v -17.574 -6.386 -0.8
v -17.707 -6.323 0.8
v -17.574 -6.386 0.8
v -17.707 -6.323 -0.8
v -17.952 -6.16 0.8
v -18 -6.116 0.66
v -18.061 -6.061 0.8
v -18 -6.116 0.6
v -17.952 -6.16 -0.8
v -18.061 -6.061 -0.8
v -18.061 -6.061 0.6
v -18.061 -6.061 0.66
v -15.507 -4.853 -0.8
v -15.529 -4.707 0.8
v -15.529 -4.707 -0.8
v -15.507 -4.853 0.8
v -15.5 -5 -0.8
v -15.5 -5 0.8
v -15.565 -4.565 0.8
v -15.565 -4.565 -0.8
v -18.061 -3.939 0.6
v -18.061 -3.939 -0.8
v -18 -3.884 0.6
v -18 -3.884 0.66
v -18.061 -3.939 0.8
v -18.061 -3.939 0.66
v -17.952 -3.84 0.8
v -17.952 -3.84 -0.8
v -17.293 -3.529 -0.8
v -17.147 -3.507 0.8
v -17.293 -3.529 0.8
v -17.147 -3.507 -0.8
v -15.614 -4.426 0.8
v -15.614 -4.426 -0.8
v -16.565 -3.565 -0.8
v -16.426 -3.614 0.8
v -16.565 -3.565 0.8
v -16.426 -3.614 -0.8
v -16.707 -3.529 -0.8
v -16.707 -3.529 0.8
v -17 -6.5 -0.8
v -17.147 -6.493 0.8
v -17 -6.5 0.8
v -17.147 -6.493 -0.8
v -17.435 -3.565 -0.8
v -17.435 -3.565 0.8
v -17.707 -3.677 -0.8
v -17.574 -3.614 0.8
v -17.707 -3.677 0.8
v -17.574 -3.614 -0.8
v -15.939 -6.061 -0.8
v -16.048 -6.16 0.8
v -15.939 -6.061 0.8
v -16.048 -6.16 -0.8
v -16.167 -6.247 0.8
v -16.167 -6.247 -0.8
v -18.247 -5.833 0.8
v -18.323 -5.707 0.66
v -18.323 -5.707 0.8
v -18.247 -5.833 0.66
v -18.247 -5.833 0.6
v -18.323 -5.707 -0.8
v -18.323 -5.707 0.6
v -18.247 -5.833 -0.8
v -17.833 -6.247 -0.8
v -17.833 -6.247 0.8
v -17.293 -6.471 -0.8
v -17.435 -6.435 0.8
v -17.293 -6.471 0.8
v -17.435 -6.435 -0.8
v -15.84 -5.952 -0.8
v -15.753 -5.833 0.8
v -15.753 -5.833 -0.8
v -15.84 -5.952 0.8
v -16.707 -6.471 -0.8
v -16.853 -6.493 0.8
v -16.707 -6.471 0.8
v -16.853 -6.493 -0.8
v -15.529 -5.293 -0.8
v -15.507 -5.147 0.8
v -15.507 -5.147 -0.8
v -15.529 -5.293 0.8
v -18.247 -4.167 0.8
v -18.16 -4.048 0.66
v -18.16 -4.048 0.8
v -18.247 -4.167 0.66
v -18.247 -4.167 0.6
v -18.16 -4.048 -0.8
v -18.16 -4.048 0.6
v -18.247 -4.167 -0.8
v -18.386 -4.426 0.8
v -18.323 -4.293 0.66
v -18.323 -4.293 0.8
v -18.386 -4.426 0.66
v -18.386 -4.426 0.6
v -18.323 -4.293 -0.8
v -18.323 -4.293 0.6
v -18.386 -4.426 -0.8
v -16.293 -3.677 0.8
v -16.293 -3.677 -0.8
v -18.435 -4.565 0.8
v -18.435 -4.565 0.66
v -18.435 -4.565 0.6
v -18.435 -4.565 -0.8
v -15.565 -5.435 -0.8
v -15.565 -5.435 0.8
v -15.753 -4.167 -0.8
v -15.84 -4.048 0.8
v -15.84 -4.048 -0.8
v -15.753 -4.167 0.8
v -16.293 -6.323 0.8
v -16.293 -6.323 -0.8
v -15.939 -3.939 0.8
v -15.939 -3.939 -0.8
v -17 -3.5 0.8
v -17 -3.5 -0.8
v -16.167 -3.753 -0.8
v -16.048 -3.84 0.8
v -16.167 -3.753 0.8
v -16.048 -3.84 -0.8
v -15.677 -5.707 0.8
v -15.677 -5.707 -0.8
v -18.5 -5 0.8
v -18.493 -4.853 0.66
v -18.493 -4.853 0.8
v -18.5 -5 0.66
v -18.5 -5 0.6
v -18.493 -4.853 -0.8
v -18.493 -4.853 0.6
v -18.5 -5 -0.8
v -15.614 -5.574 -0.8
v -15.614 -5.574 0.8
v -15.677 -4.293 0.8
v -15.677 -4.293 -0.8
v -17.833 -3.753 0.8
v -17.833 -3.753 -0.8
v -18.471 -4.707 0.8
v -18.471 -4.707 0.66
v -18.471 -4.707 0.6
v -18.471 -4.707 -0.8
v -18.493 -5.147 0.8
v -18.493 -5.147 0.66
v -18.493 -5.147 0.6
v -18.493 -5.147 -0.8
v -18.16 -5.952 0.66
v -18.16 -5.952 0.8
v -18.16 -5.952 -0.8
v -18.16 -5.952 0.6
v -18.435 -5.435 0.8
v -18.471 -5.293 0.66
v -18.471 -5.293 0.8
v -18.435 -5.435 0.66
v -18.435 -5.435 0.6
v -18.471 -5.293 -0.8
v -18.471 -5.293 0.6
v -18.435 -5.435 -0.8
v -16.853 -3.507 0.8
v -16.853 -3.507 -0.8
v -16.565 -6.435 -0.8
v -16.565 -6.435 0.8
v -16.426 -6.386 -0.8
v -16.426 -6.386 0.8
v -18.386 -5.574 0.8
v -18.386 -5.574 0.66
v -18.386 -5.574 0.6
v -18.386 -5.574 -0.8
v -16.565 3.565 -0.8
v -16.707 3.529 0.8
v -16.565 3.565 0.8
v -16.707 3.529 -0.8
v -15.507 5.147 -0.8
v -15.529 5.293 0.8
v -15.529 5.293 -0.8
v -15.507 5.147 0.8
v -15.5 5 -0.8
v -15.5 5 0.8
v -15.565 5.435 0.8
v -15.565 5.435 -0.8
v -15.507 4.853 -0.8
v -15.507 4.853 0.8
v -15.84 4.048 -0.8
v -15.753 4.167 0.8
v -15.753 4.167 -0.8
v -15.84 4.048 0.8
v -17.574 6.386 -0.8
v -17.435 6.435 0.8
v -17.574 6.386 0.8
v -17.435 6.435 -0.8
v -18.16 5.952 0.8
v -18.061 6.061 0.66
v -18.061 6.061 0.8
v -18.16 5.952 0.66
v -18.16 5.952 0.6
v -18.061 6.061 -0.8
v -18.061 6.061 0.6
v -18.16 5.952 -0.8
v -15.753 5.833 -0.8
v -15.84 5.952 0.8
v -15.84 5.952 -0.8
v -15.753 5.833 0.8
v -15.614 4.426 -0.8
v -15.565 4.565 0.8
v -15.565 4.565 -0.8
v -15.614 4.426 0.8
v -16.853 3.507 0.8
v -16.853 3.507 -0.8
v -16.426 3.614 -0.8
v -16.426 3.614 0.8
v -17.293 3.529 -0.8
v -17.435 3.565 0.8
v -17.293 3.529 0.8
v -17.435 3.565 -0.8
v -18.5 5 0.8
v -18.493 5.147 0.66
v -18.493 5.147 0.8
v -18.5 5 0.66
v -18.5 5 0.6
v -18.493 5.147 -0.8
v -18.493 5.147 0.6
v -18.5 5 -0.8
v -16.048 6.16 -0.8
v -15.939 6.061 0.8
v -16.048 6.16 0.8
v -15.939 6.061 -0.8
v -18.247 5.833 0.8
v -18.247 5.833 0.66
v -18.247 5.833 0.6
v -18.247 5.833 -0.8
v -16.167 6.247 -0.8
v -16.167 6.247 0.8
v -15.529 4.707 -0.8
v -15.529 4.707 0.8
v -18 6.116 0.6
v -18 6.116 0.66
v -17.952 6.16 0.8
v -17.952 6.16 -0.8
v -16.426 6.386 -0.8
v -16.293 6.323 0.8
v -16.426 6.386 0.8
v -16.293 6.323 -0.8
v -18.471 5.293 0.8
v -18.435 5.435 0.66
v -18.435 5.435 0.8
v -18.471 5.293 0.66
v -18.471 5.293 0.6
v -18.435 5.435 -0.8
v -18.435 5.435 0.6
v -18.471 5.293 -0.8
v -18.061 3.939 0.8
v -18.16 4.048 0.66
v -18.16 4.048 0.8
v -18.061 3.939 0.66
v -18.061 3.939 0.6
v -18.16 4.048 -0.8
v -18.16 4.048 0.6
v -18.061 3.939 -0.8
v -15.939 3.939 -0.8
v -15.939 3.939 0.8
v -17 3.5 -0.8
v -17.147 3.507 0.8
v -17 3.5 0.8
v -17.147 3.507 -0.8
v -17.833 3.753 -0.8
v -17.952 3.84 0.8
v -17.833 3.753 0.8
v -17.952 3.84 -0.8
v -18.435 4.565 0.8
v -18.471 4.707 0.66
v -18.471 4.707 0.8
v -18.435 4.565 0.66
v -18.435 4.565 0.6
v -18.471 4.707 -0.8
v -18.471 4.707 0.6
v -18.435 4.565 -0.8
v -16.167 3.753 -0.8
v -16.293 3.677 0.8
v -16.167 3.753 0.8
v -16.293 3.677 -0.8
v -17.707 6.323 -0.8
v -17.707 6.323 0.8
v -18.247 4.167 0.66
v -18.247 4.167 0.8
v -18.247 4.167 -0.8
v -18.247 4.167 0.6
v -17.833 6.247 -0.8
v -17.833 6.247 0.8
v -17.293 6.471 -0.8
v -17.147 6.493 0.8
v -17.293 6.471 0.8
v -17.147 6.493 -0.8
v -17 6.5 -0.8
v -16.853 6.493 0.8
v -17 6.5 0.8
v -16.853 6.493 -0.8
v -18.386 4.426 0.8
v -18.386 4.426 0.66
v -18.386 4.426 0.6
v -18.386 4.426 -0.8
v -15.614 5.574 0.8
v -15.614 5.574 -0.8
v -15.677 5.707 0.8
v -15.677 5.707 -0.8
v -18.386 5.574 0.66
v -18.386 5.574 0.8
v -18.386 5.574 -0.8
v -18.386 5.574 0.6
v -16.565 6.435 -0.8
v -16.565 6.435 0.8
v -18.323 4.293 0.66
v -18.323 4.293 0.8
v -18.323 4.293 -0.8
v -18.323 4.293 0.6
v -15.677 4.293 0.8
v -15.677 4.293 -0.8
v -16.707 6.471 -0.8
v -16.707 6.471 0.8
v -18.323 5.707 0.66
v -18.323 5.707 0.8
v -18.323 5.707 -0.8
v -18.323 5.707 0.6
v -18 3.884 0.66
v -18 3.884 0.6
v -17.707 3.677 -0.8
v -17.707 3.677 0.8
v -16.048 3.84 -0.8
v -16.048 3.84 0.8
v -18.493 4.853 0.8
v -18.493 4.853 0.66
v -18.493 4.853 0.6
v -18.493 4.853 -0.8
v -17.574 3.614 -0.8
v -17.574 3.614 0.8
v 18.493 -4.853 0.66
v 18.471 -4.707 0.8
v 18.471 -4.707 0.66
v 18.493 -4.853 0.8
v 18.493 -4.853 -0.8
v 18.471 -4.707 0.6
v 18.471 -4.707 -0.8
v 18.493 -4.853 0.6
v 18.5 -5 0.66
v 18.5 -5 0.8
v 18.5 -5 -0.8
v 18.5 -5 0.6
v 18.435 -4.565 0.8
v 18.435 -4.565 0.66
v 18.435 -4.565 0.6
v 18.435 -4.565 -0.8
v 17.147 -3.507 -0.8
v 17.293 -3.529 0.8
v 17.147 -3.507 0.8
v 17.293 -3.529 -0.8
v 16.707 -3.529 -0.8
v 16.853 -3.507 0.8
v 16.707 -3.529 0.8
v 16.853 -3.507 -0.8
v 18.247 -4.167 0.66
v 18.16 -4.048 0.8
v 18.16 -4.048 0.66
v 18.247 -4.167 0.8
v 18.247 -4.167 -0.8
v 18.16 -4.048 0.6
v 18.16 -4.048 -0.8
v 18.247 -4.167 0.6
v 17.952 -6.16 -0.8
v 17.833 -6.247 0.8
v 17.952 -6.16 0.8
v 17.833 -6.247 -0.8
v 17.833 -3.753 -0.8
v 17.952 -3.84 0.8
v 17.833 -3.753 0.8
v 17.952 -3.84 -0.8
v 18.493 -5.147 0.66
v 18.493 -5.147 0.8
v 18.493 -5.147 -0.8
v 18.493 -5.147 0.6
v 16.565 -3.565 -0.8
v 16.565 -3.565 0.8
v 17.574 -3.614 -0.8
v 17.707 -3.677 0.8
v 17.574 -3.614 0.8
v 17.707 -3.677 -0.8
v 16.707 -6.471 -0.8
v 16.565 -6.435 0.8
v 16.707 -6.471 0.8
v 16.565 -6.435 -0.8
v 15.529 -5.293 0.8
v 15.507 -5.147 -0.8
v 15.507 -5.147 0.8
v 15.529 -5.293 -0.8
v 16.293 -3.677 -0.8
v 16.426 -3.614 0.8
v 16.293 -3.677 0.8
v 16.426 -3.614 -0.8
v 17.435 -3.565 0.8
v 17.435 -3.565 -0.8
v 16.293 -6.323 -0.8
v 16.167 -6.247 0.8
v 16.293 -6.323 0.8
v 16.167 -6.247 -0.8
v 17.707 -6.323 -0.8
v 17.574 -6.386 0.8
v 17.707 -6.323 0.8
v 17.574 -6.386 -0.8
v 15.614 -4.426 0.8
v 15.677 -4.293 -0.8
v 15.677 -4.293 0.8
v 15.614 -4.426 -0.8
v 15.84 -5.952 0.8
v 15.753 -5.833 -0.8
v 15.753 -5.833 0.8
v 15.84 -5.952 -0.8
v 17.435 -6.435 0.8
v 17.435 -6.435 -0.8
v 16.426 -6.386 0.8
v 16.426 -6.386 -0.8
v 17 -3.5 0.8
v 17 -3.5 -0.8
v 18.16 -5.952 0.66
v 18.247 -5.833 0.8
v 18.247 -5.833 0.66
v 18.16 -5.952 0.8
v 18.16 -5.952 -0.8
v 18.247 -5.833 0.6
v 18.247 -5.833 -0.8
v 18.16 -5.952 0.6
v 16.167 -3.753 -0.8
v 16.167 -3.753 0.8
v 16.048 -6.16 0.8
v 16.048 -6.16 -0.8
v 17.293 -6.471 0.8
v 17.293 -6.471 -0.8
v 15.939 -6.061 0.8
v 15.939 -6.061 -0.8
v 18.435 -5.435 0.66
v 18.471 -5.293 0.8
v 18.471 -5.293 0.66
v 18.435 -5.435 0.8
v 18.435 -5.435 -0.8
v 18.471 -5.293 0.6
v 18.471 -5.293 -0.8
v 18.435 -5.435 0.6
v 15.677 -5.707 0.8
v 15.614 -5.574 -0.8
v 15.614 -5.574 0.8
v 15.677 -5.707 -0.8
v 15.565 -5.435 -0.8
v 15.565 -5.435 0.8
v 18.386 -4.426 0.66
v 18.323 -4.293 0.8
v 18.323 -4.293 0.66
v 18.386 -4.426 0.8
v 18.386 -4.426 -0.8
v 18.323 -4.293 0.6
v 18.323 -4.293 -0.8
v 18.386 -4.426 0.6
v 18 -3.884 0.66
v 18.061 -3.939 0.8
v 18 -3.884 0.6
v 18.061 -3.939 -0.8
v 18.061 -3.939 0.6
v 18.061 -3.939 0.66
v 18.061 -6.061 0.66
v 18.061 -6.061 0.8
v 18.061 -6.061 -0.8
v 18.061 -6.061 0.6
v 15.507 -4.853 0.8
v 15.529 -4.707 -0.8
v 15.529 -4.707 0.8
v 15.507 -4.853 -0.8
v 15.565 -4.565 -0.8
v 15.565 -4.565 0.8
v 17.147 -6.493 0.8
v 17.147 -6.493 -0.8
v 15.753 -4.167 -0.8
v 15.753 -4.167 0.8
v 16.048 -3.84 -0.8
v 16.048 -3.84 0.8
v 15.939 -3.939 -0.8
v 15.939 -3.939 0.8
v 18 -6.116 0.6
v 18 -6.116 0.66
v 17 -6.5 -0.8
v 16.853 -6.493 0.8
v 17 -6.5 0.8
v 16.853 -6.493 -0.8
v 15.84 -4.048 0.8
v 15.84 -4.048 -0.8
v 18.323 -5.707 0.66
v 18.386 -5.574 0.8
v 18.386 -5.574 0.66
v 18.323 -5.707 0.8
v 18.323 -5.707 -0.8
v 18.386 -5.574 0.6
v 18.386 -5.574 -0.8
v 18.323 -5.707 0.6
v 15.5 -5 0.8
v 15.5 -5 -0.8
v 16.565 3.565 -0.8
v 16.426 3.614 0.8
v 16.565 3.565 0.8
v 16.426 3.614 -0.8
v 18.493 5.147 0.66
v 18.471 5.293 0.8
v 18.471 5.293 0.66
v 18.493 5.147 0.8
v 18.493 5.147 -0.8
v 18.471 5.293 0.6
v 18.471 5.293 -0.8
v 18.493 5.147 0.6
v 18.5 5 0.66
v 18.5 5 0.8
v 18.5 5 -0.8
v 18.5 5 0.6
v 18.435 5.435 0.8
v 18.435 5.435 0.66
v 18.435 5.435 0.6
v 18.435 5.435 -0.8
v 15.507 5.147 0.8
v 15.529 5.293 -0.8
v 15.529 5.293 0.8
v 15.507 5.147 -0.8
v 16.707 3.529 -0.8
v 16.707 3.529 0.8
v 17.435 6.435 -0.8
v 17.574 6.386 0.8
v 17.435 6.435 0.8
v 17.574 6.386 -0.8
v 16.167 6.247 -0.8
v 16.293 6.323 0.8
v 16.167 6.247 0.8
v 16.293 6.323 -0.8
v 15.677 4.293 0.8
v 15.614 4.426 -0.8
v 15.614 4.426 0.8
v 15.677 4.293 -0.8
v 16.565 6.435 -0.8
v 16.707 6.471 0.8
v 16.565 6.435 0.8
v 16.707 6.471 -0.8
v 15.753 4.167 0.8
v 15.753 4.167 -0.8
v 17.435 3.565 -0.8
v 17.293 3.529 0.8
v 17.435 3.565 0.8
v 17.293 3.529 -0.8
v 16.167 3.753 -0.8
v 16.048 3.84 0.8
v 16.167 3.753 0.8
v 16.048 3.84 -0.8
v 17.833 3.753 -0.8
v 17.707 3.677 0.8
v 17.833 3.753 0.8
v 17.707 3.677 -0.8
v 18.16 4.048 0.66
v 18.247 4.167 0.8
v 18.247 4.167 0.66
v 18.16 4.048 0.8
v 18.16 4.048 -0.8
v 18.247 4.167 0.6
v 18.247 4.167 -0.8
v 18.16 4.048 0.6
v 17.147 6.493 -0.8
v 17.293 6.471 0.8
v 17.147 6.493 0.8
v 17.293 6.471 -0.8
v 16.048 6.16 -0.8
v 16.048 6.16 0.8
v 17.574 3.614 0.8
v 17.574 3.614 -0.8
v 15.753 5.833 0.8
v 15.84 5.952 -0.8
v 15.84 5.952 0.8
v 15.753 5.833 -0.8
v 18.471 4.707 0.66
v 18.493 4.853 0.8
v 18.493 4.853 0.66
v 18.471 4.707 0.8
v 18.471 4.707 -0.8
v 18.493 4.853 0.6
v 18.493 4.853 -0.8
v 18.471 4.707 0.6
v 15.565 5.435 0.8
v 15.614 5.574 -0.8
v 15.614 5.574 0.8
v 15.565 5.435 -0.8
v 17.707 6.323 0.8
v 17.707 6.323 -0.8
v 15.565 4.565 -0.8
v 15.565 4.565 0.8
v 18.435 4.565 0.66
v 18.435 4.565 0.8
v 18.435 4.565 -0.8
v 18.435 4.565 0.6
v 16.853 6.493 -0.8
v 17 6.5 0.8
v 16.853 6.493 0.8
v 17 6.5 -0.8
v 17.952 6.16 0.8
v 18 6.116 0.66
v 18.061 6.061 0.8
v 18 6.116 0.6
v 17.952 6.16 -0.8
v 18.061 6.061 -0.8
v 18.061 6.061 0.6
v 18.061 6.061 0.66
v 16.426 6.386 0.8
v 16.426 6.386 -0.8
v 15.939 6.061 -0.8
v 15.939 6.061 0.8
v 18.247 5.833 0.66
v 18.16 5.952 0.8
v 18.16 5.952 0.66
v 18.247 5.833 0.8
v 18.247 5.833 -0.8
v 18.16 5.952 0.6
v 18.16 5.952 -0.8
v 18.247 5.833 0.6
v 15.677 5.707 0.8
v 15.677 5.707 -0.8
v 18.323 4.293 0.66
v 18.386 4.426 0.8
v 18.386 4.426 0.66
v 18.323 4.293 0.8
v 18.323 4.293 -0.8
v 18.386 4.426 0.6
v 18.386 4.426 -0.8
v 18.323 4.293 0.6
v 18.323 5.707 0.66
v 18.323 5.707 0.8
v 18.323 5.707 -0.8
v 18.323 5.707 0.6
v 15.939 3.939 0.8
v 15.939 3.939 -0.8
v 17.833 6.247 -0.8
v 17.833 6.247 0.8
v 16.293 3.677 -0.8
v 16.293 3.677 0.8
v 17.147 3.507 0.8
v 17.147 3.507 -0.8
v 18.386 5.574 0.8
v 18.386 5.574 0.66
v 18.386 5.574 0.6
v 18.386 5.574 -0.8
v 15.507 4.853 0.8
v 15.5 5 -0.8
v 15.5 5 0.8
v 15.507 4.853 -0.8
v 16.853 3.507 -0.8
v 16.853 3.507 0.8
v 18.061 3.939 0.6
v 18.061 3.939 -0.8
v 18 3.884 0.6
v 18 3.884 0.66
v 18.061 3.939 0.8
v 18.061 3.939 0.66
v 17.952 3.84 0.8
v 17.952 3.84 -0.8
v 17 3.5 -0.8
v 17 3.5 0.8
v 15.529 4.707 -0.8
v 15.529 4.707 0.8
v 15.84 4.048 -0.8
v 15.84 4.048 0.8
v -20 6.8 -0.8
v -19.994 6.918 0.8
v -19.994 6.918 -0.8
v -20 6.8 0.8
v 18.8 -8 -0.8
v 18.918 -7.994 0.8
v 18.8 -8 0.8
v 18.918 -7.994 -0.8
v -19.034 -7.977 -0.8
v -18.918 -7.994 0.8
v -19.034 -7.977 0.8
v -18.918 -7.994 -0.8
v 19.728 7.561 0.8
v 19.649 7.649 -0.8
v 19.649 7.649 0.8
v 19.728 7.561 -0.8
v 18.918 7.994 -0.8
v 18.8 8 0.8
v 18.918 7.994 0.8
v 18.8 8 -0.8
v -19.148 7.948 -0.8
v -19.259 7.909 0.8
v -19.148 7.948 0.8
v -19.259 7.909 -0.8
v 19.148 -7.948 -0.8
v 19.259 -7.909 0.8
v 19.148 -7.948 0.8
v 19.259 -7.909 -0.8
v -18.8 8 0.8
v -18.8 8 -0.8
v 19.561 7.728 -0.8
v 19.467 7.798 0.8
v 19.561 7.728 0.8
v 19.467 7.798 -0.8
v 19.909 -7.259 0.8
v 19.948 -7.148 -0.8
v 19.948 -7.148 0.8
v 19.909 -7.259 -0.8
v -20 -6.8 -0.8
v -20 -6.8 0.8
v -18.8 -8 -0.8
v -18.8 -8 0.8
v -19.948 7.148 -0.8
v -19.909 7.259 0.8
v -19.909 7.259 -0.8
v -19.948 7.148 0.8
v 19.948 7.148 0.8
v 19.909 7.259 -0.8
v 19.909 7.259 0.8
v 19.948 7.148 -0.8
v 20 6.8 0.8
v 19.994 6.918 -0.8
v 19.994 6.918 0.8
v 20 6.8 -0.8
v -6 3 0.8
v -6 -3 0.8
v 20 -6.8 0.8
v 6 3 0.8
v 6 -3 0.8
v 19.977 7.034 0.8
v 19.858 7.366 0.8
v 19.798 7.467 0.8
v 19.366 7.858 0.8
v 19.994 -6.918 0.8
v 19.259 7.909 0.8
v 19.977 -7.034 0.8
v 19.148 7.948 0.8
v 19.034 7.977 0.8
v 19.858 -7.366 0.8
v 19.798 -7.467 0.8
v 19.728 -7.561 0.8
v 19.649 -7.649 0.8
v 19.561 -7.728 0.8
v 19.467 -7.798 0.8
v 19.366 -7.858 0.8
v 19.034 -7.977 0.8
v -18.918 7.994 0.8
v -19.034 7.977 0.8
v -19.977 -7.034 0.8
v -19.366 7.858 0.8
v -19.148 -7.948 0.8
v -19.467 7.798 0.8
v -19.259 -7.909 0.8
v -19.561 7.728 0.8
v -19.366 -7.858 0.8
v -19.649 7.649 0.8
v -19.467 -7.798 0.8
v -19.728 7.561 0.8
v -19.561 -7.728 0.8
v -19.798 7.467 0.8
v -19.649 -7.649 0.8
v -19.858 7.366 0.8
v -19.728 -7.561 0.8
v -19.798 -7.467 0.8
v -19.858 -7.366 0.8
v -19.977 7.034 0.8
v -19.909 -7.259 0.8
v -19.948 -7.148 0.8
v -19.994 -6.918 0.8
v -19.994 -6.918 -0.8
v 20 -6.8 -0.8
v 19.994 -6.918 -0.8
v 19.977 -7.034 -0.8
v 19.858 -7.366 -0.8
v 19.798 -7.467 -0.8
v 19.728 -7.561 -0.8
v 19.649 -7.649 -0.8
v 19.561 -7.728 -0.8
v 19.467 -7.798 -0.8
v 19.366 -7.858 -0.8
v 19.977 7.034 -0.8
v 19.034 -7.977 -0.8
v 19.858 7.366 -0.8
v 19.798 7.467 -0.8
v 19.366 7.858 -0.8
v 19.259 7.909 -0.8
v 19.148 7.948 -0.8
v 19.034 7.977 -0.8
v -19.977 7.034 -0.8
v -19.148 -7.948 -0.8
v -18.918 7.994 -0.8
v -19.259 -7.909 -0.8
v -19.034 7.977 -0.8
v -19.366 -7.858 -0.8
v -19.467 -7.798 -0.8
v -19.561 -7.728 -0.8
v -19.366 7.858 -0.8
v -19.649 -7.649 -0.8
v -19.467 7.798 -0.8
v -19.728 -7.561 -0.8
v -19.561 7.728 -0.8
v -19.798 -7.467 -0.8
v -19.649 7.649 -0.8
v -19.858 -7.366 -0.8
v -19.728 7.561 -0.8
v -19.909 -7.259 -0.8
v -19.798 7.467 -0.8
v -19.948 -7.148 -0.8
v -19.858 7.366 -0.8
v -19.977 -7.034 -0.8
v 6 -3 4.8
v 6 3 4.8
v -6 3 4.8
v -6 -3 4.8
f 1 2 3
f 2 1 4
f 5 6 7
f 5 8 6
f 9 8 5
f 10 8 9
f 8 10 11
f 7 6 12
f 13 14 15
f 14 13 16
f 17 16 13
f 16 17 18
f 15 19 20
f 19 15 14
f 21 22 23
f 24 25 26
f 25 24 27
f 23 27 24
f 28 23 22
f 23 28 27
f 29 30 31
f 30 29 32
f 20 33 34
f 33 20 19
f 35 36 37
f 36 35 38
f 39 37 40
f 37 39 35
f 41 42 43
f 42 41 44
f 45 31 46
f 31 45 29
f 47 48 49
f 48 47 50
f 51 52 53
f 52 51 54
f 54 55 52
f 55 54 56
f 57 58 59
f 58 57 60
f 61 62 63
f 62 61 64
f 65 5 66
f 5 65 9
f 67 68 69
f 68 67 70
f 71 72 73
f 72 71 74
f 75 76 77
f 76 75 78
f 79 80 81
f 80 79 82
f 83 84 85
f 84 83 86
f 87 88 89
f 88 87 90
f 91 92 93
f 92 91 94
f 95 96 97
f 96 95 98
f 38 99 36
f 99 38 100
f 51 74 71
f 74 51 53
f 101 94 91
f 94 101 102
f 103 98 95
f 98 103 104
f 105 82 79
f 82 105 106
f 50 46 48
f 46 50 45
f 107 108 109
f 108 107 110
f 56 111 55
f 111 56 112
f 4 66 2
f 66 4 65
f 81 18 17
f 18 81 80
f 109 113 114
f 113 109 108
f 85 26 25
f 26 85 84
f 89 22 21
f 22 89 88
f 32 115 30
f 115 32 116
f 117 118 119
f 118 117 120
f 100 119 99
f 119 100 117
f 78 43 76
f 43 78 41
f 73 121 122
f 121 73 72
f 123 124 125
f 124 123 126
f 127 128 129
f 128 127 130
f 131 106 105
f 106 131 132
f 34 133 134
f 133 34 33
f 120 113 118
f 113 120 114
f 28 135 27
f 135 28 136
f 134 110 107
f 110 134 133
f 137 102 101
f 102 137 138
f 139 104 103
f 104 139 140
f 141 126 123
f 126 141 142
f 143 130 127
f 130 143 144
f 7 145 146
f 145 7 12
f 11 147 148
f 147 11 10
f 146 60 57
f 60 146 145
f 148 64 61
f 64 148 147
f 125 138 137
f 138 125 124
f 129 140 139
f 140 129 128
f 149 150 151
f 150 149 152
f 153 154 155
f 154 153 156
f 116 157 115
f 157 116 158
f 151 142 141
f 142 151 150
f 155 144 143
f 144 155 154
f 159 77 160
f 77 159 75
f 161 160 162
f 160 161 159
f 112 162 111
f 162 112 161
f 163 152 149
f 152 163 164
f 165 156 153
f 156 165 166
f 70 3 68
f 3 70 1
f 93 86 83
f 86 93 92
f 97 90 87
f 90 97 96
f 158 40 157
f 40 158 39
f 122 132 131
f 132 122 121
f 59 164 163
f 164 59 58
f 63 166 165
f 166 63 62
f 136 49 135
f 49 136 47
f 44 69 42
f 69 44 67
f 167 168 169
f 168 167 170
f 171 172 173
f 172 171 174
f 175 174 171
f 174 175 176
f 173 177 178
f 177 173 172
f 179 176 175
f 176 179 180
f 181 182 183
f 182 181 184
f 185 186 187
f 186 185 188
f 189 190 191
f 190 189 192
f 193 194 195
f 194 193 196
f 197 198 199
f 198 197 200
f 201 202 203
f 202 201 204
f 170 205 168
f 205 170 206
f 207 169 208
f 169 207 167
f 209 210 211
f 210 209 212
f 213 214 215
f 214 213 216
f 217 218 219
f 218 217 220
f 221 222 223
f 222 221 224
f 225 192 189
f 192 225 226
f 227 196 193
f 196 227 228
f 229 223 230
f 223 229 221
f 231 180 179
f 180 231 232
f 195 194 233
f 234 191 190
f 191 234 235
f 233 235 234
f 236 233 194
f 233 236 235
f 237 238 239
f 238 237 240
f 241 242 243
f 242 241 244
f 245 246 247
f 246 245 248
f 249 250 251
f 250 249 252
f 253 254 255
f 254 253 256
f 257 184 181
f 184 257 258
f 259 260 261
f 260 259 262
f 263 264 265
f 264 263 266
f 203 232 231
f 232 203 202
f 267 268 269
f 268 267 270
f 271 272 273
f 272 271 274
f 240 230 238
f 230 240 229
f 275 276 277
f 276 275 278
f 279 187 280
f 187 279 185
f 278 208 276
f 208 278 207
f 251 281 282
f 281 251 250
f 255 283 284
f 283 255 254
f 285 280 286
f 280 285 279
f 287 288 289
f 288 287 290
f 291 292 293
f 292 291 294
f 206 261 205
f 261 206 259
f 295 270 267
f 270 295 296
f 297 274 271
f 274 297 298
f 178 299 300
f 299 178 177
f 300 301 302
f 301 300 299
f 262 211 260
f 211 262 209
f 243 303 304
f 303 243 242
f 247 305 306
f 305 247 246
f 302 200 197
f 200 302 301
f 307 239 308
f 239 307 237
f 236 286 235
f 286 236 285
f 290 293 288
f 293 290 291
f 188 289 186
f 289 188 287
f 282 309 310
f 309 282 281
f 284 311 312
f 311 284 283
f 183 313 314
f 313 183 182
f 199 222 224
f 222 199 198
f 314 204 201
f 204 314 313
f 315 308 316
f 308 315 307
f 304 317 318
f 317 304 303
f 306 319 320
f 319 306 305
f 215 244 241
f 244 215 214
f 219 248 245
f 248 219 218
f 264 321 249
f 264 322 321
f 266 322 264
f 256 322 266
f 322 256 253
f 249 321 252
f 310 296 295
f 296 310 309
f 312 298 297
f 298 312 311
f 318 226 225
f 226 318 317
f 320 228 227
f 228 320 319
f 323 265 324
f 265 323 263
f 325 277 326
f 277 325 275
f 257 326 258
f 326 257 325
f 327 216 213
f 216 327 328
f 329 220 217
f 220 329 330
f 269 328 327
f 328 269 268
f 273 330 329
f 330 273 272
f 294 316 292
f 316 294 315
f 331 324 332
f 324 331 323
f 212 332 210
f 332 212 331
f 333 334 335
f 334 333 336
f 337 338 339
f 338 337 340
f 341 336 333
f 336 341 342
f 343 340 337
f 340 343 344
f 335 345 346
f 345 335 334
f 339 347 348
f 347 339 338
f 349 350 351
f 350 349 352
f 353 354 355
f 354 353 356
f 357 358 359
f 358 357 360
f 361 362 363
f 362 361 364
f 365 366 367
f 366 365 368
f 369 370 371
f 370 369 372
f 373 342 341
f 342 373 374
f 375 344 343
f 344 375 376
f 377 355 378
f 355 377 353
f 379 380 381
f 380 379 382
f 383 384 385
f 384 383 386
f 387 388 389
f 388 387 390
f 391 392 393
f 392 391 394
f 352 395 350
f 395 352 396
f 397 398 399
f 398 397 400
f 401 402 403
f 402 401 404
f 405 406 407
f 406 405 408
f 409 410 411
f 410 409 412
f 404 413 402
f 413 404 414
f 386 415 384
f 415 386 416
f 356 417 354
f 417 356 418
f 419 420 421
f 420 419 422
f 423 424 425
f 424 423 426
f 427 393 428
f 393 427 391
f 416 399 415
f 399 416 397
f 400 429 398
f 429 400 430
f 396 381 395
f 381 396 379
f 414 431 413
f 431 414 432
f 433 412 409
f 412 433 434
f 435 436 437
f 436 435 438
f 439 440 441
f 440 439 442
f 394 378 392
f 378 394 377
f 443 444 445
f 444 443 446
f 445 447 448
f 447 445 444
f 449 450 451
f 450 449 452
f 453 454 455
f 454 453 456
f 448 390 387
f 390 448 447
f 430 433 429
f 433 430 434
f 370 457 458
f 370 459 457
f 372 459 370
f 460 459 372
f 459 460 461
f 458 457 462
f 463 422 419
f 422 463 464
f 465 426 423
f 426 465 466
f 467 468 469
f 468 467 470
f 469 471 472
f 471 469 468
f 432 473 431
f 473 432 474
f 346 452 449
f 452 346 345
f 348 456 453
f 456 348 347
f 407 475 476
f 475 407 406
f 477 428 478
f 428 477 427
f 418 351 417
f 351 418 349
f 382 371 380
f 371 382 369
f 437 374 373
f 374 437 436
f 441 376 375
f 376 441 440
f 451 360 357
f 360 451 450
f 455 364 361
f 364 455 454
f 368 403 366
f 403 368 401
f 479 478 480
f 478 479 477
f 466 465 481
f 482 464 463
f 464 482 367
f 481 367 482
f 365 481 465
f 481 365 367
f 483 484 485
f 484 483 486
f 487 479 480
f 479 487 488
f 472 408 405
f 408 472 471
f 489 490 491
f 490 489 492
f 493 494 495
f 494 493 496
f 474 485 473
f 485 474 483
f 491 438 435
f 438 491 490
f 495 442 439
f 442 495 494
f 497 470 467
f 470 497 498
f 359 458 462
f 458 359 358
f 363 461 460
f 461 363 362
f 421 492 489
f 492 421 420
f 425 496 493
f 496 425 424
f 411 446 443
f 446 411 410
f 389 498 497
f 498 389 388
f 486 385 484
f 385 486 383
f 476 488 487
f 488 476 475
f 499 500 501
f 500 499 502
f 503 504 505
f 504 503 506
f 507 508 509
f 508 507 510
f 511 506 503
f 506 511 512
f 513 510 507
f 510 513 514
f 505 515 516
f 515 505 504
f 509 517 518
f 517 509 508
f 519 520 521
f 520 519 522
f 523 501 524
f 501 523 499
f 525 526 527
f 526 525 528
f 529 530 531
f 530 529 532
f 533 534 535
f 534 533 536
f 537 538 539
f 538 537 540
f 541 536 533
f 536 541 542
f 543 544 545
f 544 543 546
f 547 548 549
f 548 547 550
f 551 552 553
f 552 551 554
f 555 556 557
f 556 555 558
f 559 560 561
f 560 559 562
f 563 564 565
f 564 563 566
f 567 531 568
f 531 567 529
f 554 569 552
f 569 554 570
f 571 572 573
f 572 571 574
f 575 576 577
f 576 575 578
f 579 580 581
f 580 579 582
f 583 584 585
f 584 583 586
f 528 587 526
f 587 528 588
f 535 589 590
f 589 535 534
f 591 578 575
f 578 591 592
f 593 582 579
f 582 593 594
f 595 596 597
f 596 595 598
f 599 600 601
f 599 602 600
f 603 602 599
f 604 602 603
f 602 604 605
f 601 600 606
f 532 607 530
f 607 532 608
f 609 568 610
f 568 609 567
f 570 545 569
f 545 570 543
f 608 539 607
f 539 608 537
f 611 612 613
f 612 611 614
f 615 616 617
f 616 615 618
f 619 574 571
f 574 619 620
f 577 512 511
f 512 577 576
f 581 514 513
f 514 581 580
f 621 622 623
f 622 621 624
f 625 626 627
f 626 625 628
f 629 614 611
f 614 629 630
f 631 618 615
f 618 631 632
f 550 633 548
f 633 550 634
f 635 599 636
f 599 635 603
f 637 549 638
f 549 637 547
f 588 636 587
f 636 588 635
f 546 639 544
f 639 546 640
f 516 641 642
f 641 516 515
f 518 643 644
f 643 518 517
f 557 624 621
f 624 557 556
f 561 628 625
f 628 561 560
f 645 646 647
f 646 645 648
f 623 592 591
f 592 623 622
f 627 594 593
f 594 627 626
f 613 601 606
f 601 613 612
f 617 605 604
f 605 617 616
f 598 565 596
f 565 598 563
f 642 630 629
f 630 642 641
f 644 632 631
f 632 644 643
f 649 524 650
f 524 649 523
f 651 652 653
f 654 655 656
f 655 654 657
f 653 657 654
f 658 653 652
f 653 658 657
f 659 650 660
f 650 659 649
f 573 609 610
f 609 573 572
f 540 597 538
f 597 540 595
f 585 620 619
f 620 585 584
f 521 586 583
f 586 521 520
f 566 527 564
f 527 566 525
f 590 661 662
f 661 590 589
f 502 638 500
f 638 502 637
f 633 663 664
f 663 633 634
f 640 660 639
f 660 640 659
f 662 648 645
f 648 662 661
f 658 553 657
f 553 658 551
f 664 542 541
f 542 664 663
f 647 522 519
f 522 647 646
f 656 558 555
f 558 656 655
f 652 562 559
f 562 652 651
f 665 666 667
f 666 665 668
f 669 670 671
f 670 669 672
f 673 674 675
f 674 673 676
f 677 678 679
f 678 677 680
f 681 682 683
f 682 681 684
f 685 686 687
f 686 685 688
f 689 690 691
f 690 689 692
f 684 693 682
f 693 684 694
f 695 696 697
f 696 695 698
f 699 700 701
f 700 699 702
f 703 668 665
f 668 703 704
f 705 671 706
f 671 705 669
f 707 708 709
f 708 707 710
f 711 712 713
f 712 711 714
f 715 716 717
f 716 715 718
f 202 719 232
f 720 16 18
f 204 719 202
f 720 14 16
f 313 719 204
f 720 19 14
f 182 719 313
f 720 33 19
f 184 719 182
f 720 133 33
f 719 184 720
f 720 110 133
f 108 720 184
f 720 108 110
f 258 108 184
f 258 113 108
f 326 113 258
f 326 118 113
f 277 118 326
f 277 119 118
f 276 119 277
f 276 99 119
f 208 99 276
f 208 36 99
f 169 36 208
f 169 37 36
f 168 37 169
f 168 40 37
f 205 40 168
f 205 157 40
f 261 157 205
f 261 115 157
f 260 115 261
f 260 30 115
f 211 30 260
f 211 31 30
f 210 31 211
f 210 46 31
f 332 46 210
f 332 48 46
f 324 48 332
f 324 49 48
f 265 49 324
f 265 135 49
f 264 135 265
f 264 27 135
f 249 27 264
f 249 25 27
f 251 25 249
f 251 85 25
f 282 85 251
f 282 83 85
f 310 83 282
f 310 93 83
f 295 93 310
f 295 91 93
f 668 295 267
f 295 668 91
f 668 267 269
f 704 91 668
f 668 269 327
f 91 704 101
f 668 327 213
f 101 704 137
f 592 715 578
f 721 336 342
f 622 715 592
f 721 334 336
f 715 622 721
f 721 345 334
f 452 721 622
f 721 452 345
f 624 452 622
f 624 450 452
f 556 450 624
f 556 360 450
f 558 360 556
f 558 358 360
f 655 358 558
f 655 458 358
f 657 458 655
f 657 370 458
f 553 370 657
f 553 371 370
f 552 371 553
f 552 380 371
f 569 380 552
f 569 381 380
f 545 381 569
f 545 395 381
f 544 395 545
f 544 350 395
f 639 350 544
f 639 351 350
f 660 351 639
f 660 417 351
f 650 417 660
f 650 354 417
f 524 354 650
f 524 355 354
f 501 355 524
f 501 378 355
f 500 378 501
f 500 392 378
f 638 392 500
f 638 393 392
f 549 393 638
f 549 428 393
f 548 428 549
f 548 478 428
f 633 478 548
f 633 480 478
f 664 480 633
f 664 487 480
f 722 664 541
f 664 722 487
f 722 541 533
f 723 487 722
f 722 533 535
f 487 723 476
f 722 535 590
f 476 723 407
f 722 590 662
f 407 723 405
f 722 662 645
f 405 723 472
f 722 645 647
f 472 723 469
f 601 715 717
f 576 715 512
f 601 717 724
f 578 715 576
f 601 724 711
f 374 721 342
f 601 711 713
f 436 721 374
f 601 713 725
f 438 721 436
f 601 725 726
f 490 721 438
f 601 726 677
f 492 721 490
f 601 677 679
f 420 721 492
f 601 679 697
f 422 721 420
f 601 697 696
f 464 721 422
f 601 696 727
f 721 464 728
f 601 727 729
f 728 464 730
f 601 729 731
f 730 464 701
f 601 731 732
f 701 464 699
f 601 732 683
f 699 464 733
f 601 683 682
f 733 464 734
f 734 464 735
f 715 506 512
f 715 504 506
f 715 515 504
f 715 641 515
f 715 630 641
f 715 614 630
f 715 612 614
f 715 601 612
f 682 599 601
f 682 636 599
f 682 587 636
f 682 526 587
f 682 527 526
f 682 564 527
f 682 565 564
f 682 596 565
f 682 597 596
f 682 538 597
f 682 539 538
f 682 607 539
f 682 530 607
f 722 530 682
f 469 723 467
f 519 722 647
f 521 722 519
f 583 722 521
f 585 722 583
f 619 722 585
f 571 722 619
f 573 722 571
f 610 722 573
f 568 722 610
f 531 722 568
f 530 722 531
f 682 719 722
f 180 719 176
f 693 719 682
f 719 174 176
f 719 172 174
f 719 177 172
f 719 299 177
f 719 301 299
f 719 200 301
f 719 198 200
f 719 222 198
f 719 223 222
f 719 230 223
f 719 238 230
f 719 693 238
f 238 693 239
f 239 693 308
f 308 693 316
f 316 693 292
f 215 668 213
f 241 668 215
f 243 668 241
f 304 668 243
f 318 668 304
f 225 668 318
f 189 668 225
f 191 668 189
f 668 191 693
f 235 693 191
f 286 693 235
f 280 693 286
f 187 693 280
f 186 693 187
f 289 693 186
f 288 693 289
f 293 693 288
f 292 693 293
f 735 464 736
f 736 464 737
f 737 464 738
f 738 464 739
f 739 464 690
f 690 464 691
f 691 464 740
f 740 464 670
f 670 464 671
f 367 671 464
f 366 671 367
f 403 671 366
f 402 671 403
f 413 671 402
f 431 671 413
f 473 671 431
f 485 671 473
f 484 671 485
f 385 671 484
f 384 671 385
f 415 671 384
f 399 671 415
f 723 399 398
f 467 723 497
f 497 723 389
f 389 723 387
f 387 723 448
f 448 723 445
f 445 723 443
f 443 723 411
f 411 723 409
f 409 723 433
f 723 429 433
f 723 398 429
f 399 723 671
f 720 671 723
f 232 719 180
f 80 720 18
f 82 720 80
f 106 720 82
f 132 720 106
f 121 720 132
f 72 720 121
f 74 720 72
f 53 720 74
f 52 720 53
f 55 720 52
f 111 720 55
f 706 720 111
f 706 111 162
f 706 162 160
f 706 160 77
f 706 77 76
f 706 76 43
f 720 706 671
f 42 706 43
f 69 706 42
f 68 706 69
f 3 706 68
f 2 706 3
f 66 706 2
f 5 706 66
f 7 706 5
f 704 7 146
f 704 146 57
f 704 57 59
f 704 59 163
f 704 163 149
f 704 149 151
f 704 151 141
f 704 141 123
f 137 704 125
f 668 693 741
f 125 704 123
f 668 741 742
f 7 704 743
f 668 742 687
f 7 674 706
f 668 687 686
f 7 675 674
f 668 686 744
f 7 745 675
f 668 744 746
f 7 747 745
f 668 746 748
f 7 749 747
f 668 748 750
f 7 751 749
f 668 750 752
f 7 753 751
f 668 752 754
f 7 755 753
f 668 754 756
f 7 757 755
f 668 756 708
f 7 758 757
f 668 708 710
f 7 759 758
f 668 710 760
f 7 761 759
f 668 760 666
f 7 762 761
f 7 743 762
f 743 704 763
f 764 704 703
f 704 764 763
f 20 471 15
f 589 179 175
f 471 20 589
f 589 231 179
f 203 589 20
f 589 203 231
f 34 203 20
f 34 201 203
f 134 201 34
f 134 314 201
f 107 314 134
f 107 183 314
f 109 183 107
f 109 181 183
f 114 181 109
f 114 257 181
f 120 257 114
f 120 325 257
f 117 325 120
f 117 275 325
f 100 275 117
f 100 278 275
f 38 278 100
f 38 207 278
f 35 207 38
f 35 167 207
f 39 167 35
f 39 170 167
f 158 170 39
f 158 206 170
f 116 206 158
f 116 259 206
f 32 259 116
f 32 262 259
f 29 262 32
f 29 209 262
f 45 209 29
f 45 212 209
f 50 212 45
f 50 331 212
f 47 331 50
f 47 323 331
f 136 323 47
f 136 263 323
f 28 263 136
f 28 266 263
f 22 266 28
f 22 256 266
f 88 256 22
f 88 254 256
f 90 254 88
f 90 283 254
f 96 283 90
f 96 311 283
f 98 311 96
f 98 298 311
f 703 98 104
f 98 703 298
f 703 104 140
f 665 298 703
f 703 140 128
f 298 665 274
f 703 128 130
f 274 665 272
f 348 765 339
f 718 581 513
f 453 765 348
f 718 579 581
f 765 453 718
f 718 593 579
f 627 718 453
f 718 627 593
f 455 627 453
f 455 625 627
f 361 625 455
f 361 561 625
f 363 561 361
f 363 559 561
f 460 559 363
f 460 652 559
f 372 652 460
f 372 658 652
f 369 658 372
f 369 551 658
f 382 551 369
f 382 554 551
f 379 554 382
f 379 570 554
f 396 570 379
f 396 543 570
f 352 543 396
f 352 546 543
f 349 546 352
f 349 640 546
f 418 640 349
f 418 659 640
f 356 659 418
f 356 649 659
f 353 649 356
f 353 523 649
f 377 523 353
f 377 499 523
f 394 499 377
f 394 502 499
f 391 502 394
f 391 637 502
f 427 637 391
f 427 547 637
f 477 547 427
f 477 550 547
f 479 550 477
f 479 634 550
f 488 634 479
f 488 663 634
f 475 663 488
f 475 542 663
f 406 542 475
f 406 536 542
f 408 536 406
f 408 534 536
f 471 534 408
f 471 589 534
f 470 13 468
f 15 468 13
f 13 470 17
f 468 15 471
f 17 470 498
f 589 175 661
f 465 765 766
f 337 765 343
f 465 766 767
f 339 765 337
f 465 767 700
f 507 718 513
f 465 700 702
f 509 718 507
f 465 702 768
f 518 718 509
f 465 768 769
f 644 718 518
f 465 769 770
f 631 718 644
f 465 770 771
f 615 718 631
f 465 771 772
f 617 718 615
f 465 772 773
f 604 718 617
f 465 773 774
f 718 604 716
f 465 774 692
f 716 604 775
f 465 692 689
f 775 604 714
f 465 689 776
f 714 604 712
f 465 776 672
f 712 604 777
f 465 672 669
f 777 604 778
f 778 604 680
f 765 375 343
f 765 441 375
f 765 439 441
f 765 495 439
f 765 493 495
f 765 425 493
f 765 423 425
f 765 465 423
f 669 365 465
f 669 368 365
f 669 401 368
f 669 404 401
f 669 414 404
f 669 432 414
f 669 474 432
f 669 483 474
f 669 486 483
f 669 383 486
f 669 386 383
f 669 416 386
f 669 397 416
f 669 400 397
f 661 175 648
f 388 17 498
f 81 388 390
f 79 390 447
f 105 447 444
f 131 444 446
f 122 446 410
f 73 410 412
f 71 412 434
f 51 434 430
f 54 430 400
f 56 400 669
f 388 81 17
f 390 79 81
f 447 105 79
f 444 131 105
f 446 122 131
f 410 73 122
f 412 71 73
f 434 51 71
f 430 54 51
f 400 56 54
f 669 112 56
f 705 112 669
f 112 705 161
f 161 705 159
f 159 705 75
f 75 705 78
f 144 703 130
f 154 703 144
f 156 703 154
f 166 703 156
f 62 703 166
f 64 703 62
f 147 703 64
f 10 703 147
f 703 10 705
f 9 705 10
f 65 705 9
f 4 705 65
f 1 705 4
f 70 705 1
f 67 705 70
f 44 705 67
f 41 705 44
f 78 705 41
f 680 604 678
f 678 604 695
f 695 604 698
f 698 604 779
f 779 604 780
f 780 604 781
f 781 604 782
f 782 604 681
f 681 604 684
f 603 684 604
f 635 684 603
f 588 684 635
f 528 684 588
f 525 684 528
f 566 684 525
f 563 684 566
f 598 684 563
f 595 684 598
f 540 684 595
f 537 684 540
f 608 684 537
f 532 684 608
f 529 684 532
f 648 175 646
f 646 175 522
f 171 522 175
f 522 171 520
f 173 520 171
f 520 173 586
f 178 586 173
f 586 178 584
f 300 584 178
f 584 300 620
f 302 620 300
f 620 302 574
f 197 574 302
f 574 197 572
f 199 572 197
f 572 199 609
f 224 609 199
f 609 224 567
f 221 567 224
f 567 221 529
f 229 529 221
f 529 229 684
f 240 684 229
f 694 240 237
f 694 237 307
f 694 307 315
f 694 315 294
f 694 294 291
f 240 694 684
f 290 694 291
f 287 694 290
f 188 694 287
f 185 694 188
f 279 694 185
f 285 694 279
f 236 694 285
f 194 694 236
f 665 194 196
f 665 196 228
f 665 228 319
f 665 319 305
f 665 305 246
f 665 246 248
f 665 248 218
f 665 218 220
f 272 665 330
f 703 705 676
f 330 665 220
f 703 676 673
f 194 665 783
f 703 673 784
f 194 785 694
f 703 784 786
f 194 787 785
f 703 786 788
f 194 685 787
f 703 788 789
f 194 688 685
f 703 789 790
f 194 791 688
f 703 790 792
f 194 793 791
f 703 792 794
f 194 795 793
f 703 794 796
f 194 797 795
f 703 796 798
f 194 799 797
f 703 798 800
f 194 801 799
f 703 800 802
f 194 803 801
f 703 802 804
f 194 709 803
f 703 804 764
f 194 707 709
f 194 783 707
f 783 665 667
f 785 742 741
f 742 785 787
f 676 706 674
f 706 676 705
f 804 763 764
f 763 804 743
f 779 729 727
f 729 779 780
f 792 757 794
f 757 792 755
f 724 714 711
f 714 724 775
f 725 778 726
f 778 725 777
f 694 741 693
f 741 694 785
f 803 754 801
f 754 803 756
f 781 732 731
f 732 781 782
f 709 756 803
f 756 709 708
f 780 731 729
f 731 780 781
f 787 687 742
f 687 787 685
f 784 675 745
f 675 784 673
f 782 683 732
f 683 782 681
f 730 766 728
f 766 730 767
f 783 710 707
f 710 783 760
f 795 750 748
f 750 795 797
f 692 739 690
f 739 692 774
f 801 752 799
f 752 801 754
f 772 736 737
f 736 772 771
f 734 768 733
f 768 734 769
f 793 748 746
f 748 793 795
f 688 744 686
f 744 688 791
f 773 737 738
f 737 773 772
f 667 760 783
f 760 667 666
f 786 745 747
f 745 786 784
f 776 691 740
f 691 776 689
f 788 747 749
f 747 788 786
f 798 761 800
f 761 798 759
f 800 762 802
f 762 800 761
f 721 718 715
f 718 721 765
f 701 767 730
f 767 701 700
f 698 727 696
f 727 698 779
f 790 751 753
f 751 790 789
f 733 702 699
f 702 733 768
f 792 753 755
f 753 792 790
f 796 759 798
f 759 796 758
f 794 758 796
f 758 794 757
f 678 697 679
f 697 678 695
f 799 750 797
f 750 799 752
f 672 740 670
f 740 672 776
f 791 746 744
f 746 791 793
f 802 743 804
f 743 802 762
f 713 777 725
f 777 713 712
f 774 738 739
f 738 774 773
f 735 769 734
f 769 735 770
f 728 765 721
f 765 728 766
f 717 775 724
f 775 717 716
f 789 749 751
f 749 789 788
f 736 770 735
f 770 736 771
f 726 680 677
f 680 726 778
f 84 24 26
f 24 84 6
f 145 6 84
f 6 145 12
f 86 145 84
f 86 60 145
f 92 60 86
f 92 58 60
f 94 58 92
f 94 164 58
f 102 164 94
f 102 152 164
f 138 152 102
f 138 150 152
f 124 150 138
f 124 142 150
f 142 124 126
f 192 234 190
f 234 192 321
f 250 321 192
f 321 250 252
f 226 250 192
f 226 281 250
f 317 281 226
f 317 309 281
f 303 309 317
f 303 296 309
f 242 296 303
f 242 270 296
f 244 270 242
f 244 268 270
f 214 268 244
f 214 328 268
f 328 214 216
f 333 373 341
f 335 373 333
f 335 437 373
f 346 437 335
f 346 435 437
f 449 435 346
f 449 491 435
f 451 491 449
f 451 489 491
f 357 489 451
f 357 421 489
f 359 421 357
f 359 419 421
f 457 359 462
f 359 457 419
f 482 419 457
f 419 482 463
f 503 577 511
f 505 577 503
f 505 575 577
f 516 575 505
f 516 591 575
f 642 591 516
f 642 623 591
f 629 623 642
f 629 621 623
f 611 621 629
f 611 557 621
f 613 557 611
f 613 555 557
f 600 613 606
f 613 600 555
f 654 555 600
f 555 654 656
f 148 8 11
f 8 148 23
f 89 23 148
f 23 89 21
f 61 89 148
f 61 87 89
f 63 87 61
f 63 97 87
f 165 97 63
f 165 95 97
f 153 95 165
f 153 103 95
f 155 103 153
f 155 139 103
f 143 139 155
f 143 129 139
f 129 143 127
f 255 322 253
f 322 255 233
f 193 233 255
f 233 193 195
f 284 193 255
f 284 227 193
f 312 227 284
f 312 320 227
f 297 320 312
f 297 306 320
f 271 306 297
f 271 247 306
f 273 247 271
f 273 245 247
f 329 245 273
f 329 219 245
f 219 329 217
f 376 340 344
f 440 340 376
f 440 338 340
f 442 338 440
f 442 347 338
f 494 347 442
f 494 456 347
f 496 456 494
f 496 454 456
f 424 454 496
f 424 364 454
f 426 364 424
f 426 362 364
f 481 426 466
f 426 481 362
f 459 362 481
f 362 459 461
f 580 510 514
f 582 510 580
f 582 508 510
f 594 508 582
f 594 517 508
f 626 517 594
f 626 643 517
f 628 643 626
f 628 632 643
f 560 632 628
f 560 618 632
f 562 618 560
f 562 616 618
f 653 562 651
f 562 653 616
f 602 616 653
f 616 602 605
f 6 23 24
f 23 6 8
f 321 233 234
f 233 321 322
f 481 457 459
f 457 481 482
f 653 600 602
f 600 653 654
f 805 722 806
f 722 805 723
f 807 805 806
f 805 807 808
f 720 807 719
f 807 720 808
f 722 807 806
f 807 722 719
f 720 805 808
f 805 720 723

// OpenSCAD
$fn = 64;

// Parameters
length_mm = 40; //[20:80:1]
width_mm  = 16; //[8:32:1]
thickness_mm = 1.6; //[0.8:3.2:0.1]

// Feature parameters
corner_r = 1.2;                 // rounded corner radius
hole_d = 3.0;                   // mounting hole diameter
hole_edge_x = 3.0;              // hole center offset from left/right edge
hole_edge_y = 3.0;              // hole center offset from bottom/top edge

copper_t = 0.08;                // copper thickness (visual)
silk_t   = 0.06;                // silkscreen thickness (visual)

// Structural overlap to guarantee attachment (1-2mm as required)
overlap_mm = 1.0;

// Simple connector block on top side
conn_w = 12.0;
conn_d = 6.0;
conn_h = 5.0;

// Helper: rounded rectangle prism (centered)
module rounded_plate(l, w, h, r) {
    linear_extrude(height=h, center=true)
        offset(r=r)
            square([l - 2*r, w - 2*r], center=true);
}

module RAMPSEndstop() {

    // Derived Z positions (centered model)
    pcb_top_z =  thickness_mm/2;

    // --- FIX: Ensure connector is physically attached (overlaps PCB in Z by overlap_mm)
    // Bottom of connector = pcb_top_z - overlap_mm
    // Center Z = bottom + conn_h/2
    conn_center_z = (pcb_top_z - overlap_mm) + conn_h/2;

    // --- FIX: Ensure connector is not offset away from PCB in Y.
    // Place it centered in Y so it visibly sits on the PCB in all views.
    conn_center_y = 0;

    // Pins: ensure they intersect the connector body (and optionally the PCB)
    pin_d = 1.0;
    pin_h = 3.0;
    pin_pitch = 2.54;

    // Put pins so their TOP penetrates into connector by overlap_mm
    // pin_top_z = conn_center_z + conn_h/2 - overlap_mm
    // => pin_center_z = pin_top_z - pin_h/2
    pin_center_z = (conn_center_z + conn_h/2 - overlap_mm) - pin_h/2;

    // Put pins under the connector in Y, slightly inside the connector depth
    pin_center_y = conn_center_y - conn_d/2 + pin_d/2 + overlap_mm;

    union() {

        // PCB body with mounting holes
        color([0.0, 0.4, 0.2])
        difference() {
            rounded_plate(length_mm, width_mm, thickness_mm, corner_r);

            // 4 corner mounting holes (through)
            for (sx = [-1, 1], sy = [-1, 1]) {
                translate([ sx*(length_mm/2 - hole_edge_x),
                            sy*(width_mm/2  - hole_edge_y),
                            0 ])
                    cylinder(d=hole_d, h=thickness_mm + 2, center=true);
            }
        }

        // Copper pads/traces (top) - thin raised features, overlapped into PCB
        color([0.75, 0.45, 0.1])
        translate([0, 0, pcb_top_z + copper_t/2 - 0.2])  // small embed for manifold
        union() {
            cube([length_mm*0.75, 1.2, copper_t], center=true);

            for (i = [-2:2]) {
                translate([i*(length_mm*0.12), width_mm*0.18, 0])
                    cube([2.2, 2.2, copper_t], center=true);
            }
        }

        // Silkscreen outline (top) - thin raised border, overlapped into PCB
        color([0.95, 0.95, 0.95])
        translate([0, 0, pcb_top_z + silk_t/2 - 0.2])    // small embed for manifold
        difference() {
            rounded_plate(length_mm*0.98, width_mm*0.98, silk_t, max(0.6, corner_r*0.8));
            rounded_plate(length_mm*0.90, width_mm*0.90, silk_t + 0.2, max(0.4, corner_r*0.6));
        }

        // Connector block (black) - FIXED: overlaps PCB in Z and is centered in Y (no side offset)
        color([0.1, 0.1, 0.1])
        translate([0, conn_center_y, conn_center_z])
            cube([conn_w, conn_d, conn_h], center=true);

        // Pins - intersect connector (and can reach into PCB depending on dimensions)
        for (k = [-1, 0, 1]) {
            color([0.8, 0.8, 0.8])
            translate([k*pin_pitch, pin_center_y, pin_center_z])
                cylinder(d=pin_d, h=pin_h, center=true);
        }
    }
}

// Assembly
module assembly() {
    RAMPSEndstop();
}

assembly();
